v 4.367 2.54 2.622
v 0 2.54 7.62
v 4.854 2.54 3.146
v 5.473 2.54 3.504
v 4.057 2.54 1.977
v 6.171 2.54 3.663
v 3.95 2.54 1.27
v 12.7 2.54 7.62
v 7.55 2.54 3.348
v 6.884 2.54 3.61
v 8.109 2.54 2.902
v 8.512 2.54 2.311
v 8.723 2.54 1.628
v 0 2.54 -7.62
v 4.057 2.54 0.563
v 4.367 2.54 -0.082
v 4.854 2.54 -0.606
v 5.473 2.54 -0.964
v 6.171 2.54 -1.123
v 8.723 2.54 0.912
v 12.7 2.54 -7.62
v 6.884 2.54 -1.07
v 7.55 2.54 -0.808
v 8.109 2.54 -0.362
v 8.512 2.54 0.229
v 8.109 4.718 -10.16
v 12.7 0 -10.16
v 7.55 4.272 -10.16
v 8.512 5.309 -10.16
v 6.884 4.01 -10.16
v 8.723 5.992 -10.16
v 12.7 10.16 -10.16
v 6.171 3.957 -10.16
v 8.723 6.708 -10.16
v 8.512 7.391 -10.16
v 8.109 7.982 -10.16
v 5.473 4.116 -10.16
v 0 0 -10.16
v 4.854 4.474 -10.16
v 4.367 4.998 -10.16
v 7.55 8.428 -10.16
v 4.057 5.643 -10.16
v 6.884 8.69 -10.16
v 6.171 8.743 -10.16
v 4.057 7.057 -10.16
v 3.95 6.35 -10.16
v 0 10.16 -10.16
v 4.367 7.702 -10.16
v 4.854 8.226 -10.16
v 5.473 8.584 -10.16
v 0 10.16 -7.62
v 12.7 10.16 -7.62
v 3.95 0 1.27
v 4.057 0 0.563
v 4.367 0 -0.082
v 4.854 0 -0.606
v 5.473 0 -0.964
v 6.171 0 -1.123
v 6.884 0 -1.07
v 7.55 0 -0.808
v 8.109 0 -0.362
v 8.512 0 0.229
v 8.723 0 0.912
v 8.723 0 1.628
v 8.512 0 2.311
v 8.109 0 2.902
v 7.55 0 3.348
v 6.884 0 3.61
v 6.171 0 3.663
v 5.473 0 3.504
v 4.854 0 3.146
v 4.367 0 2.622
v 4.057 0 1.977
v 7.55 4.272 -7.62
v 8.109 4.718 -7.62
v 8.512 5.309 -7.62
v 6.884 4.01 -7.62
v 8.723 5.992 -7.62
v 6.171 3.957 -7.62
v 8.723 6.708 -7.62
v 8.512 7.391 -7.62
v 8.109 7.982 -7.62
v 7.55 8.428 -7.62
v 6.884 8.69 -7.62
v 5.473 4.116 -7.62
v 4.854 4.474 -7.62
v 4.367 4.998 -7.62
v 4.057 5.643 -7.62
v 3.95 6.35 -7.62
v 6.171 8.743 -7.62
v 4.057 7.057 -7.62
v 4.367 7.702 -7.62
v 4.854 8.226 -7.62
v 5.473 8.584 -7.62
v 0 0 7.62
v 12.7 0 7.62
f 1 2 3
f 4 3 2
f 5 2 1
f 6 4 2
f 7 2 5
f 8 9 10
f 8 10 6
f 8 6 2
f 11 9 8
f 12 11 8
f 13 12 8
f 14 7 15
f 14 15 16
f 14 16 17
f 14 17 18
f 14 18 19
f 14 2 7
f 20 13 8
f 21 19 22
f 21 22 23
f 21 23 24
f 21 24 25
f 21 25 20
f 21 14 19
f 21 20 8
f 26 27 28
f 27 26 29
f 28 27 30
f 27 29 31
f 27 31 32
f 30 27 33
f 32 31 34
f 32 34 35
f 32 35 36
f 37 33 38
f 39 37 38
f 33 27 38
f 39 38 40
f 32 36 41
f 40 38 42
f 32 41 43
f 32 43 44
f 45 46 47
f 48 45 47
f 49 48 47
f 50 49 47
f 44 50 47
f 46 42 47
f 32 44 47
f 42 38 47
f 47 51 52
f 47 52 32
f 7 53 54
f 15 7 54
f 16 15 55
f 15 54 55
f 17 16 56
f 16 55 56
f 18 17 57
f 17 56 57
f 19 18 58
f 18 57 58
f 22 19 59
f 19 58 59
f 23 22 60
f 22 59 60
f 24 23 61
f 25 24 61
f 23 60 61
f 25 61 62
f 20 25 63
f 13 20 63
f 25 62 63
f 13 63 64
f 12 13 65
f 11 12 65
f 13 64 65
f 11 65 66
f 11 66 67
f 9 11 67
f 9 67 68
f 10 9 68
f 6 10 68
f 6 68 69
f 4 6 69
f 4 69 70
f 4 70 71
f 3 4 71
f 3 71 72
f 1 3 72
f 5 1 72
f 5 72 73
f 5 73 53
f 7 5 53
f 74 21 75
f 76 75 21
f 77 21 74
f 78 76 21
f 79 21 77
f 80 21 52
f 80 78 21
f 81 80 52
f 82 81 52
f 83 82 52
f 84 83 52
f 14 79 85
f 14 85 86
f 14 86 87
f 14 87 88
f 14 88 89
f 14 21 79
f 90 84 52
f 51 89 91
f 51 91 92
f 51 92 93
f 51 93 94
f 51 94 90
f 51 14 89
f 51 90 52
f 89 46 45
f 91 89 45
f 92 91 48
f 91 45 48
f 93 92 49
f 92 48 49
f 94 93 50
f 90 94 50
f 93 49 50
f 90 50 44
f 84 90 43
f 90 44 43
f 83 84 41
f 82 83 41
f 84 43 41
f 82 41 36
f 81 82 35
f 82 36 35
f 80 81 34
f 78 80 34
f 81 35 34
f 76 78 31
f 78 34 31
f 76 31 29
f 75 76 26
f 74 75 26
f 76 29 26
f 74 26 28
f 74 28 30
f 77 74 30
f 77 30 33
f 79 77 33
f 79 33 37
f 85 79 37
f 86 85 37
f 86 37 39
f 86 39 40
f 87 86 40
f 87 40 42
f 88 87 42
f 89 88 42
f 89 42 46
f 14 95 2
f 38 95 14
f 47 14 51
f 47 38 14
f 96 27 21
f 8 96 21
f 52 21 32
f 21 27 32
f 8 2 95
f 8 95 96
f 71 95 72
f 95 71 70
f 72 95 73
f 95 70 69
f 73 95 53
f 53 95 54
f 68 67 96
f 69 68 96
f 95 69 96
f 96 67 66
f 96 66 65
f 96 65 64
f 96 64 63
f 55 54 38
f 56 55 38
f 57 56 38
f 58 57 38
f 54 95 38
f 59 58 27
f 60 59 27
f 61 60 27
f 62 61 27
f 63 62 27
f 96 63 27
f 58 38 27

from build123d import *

# Parameters (mm, degrees)
SKETCH2_W               = 10.16
SKETCH2_H               = 10.16
BOSS_EXTRUDE1_DEPTH     = 38.1
CUT_EXTRUDE1_DEPTH      = 41.719297636
CUT_EXTRUDE1_DEPTH_BACK = 38.1
SKETCH3_W               = 7.62
SKETCH3_H               = 7.62
M4_CLEARANCE_HOLE2_D    = 4.8
SKETCH13_W              = 38.1
SKETCH13_H              = 2.54
BOSS_EXTRUDE2_DEPTH     = 7.62
M4_CLEARANCE_HOLE3_D    = 4.8
CUT_EXTRUDE2_REACH      = 45.255
SKETCH17_W              = 25.4
SKETCH17_H              = 10.16


with BuildPart() as part:
    # Sketch2 → Boss-Extrude1 (new body)
    with BuildSketch(Plane(origin=(0, 0, 0), x_dir=(0, 0, -1), z_dir=(1, 0, 0))):
        with Locations((5.08, 5.08)):
            Rectangle(SKETCH2_W, SKETCH2_H)
    extrude(amount=BOSS_EXTRUDE1_DEPTH)

    # Sketch3 → Cut-Extrude1 (cut, two sides: drawn at the far end of the back side and taken through both)
    with BuildSketch(Plane(origin=(38.1, 0, 0), x_dir=(0, 0, -1), z_dir=(1, 0, 0)).offset(-CUT_EXTRUDE1_DEPTH_BACK)):
        with Locations((3.81, 6.35)):
            Rectangle(SKETCH3_W, SKETCH3_H)
    extrude(amount=CUT_EXTRUDE1_DEPTH + CUT_EXTRUDE1_DEPTH_BACK, mode=Mode.SUBTRACT)

    # M4 Clearance Hole2 (through all)
    with Locations(Plane.XY.offset(-7.62)):
        with Locations((6.35, 6.35), (31.75, 6.35)):
            Hole(M4_CLEARANCE_HOLE2_D / 2)

    # Sketch13 → Boss-Extrude2 (add)
    with BuildSketch(Plane.XY):
        with Locations((19.05, 1.27)):
            Rectangle(SKETCH13_W, SKETCH13_H)
    extrude(amount=BOSS_EXTRUDE2_DEPTH)

    # M4 Clearance Hole3 (through all)
    with Locations(Plane(origin=(0, 2.54, 0), x_dir=(1, 0, 0), z_dir=(0, 1, 0))):
        with Locations((6.35, -1.27), (31.75, -1.27)):
            Hole(M4_CLEARANCE_HOLE3_D / 2)

    # Cut-Extrude2: up to this face of the body (flat: up to its plane)
    cut_extrude2_end = Plane(part.part.faces().sort_by_distance((19.05, 1.27, 7.62))[0])
    # Sketch17 → Cut-Extrude2 (cut, up to the picked face)
    with BuildSketch(Plane(origin=(0, 0, -10.16), x_dir=(-1, 0, 0), z_dir=(0, 0, -1)), mode=Mode.PRIVATE) as cut_extrude2_sk1:
        with Locations((-25.4, 5.08)):
            Rectangle(SKETCH17_W, SKETCH17_H)
    cut_extrude2_tool1 = split(extrude(cut_extrude2_sk1.sketch, amount=-CUT_EXTRUDE2_REACH, mode=Mode.PRIVATE), bisect_by=cut_extrude2_end, keep=Keep.BOTH, mode=Mode.PRIVATE)
    add(cut_extrude2_tool1.solids().sort_by(Axis((25.4, 5.08, -10.16), (0, 0, 1)))[0], mode=Mode.SUBTRACT)


solid = part.part
